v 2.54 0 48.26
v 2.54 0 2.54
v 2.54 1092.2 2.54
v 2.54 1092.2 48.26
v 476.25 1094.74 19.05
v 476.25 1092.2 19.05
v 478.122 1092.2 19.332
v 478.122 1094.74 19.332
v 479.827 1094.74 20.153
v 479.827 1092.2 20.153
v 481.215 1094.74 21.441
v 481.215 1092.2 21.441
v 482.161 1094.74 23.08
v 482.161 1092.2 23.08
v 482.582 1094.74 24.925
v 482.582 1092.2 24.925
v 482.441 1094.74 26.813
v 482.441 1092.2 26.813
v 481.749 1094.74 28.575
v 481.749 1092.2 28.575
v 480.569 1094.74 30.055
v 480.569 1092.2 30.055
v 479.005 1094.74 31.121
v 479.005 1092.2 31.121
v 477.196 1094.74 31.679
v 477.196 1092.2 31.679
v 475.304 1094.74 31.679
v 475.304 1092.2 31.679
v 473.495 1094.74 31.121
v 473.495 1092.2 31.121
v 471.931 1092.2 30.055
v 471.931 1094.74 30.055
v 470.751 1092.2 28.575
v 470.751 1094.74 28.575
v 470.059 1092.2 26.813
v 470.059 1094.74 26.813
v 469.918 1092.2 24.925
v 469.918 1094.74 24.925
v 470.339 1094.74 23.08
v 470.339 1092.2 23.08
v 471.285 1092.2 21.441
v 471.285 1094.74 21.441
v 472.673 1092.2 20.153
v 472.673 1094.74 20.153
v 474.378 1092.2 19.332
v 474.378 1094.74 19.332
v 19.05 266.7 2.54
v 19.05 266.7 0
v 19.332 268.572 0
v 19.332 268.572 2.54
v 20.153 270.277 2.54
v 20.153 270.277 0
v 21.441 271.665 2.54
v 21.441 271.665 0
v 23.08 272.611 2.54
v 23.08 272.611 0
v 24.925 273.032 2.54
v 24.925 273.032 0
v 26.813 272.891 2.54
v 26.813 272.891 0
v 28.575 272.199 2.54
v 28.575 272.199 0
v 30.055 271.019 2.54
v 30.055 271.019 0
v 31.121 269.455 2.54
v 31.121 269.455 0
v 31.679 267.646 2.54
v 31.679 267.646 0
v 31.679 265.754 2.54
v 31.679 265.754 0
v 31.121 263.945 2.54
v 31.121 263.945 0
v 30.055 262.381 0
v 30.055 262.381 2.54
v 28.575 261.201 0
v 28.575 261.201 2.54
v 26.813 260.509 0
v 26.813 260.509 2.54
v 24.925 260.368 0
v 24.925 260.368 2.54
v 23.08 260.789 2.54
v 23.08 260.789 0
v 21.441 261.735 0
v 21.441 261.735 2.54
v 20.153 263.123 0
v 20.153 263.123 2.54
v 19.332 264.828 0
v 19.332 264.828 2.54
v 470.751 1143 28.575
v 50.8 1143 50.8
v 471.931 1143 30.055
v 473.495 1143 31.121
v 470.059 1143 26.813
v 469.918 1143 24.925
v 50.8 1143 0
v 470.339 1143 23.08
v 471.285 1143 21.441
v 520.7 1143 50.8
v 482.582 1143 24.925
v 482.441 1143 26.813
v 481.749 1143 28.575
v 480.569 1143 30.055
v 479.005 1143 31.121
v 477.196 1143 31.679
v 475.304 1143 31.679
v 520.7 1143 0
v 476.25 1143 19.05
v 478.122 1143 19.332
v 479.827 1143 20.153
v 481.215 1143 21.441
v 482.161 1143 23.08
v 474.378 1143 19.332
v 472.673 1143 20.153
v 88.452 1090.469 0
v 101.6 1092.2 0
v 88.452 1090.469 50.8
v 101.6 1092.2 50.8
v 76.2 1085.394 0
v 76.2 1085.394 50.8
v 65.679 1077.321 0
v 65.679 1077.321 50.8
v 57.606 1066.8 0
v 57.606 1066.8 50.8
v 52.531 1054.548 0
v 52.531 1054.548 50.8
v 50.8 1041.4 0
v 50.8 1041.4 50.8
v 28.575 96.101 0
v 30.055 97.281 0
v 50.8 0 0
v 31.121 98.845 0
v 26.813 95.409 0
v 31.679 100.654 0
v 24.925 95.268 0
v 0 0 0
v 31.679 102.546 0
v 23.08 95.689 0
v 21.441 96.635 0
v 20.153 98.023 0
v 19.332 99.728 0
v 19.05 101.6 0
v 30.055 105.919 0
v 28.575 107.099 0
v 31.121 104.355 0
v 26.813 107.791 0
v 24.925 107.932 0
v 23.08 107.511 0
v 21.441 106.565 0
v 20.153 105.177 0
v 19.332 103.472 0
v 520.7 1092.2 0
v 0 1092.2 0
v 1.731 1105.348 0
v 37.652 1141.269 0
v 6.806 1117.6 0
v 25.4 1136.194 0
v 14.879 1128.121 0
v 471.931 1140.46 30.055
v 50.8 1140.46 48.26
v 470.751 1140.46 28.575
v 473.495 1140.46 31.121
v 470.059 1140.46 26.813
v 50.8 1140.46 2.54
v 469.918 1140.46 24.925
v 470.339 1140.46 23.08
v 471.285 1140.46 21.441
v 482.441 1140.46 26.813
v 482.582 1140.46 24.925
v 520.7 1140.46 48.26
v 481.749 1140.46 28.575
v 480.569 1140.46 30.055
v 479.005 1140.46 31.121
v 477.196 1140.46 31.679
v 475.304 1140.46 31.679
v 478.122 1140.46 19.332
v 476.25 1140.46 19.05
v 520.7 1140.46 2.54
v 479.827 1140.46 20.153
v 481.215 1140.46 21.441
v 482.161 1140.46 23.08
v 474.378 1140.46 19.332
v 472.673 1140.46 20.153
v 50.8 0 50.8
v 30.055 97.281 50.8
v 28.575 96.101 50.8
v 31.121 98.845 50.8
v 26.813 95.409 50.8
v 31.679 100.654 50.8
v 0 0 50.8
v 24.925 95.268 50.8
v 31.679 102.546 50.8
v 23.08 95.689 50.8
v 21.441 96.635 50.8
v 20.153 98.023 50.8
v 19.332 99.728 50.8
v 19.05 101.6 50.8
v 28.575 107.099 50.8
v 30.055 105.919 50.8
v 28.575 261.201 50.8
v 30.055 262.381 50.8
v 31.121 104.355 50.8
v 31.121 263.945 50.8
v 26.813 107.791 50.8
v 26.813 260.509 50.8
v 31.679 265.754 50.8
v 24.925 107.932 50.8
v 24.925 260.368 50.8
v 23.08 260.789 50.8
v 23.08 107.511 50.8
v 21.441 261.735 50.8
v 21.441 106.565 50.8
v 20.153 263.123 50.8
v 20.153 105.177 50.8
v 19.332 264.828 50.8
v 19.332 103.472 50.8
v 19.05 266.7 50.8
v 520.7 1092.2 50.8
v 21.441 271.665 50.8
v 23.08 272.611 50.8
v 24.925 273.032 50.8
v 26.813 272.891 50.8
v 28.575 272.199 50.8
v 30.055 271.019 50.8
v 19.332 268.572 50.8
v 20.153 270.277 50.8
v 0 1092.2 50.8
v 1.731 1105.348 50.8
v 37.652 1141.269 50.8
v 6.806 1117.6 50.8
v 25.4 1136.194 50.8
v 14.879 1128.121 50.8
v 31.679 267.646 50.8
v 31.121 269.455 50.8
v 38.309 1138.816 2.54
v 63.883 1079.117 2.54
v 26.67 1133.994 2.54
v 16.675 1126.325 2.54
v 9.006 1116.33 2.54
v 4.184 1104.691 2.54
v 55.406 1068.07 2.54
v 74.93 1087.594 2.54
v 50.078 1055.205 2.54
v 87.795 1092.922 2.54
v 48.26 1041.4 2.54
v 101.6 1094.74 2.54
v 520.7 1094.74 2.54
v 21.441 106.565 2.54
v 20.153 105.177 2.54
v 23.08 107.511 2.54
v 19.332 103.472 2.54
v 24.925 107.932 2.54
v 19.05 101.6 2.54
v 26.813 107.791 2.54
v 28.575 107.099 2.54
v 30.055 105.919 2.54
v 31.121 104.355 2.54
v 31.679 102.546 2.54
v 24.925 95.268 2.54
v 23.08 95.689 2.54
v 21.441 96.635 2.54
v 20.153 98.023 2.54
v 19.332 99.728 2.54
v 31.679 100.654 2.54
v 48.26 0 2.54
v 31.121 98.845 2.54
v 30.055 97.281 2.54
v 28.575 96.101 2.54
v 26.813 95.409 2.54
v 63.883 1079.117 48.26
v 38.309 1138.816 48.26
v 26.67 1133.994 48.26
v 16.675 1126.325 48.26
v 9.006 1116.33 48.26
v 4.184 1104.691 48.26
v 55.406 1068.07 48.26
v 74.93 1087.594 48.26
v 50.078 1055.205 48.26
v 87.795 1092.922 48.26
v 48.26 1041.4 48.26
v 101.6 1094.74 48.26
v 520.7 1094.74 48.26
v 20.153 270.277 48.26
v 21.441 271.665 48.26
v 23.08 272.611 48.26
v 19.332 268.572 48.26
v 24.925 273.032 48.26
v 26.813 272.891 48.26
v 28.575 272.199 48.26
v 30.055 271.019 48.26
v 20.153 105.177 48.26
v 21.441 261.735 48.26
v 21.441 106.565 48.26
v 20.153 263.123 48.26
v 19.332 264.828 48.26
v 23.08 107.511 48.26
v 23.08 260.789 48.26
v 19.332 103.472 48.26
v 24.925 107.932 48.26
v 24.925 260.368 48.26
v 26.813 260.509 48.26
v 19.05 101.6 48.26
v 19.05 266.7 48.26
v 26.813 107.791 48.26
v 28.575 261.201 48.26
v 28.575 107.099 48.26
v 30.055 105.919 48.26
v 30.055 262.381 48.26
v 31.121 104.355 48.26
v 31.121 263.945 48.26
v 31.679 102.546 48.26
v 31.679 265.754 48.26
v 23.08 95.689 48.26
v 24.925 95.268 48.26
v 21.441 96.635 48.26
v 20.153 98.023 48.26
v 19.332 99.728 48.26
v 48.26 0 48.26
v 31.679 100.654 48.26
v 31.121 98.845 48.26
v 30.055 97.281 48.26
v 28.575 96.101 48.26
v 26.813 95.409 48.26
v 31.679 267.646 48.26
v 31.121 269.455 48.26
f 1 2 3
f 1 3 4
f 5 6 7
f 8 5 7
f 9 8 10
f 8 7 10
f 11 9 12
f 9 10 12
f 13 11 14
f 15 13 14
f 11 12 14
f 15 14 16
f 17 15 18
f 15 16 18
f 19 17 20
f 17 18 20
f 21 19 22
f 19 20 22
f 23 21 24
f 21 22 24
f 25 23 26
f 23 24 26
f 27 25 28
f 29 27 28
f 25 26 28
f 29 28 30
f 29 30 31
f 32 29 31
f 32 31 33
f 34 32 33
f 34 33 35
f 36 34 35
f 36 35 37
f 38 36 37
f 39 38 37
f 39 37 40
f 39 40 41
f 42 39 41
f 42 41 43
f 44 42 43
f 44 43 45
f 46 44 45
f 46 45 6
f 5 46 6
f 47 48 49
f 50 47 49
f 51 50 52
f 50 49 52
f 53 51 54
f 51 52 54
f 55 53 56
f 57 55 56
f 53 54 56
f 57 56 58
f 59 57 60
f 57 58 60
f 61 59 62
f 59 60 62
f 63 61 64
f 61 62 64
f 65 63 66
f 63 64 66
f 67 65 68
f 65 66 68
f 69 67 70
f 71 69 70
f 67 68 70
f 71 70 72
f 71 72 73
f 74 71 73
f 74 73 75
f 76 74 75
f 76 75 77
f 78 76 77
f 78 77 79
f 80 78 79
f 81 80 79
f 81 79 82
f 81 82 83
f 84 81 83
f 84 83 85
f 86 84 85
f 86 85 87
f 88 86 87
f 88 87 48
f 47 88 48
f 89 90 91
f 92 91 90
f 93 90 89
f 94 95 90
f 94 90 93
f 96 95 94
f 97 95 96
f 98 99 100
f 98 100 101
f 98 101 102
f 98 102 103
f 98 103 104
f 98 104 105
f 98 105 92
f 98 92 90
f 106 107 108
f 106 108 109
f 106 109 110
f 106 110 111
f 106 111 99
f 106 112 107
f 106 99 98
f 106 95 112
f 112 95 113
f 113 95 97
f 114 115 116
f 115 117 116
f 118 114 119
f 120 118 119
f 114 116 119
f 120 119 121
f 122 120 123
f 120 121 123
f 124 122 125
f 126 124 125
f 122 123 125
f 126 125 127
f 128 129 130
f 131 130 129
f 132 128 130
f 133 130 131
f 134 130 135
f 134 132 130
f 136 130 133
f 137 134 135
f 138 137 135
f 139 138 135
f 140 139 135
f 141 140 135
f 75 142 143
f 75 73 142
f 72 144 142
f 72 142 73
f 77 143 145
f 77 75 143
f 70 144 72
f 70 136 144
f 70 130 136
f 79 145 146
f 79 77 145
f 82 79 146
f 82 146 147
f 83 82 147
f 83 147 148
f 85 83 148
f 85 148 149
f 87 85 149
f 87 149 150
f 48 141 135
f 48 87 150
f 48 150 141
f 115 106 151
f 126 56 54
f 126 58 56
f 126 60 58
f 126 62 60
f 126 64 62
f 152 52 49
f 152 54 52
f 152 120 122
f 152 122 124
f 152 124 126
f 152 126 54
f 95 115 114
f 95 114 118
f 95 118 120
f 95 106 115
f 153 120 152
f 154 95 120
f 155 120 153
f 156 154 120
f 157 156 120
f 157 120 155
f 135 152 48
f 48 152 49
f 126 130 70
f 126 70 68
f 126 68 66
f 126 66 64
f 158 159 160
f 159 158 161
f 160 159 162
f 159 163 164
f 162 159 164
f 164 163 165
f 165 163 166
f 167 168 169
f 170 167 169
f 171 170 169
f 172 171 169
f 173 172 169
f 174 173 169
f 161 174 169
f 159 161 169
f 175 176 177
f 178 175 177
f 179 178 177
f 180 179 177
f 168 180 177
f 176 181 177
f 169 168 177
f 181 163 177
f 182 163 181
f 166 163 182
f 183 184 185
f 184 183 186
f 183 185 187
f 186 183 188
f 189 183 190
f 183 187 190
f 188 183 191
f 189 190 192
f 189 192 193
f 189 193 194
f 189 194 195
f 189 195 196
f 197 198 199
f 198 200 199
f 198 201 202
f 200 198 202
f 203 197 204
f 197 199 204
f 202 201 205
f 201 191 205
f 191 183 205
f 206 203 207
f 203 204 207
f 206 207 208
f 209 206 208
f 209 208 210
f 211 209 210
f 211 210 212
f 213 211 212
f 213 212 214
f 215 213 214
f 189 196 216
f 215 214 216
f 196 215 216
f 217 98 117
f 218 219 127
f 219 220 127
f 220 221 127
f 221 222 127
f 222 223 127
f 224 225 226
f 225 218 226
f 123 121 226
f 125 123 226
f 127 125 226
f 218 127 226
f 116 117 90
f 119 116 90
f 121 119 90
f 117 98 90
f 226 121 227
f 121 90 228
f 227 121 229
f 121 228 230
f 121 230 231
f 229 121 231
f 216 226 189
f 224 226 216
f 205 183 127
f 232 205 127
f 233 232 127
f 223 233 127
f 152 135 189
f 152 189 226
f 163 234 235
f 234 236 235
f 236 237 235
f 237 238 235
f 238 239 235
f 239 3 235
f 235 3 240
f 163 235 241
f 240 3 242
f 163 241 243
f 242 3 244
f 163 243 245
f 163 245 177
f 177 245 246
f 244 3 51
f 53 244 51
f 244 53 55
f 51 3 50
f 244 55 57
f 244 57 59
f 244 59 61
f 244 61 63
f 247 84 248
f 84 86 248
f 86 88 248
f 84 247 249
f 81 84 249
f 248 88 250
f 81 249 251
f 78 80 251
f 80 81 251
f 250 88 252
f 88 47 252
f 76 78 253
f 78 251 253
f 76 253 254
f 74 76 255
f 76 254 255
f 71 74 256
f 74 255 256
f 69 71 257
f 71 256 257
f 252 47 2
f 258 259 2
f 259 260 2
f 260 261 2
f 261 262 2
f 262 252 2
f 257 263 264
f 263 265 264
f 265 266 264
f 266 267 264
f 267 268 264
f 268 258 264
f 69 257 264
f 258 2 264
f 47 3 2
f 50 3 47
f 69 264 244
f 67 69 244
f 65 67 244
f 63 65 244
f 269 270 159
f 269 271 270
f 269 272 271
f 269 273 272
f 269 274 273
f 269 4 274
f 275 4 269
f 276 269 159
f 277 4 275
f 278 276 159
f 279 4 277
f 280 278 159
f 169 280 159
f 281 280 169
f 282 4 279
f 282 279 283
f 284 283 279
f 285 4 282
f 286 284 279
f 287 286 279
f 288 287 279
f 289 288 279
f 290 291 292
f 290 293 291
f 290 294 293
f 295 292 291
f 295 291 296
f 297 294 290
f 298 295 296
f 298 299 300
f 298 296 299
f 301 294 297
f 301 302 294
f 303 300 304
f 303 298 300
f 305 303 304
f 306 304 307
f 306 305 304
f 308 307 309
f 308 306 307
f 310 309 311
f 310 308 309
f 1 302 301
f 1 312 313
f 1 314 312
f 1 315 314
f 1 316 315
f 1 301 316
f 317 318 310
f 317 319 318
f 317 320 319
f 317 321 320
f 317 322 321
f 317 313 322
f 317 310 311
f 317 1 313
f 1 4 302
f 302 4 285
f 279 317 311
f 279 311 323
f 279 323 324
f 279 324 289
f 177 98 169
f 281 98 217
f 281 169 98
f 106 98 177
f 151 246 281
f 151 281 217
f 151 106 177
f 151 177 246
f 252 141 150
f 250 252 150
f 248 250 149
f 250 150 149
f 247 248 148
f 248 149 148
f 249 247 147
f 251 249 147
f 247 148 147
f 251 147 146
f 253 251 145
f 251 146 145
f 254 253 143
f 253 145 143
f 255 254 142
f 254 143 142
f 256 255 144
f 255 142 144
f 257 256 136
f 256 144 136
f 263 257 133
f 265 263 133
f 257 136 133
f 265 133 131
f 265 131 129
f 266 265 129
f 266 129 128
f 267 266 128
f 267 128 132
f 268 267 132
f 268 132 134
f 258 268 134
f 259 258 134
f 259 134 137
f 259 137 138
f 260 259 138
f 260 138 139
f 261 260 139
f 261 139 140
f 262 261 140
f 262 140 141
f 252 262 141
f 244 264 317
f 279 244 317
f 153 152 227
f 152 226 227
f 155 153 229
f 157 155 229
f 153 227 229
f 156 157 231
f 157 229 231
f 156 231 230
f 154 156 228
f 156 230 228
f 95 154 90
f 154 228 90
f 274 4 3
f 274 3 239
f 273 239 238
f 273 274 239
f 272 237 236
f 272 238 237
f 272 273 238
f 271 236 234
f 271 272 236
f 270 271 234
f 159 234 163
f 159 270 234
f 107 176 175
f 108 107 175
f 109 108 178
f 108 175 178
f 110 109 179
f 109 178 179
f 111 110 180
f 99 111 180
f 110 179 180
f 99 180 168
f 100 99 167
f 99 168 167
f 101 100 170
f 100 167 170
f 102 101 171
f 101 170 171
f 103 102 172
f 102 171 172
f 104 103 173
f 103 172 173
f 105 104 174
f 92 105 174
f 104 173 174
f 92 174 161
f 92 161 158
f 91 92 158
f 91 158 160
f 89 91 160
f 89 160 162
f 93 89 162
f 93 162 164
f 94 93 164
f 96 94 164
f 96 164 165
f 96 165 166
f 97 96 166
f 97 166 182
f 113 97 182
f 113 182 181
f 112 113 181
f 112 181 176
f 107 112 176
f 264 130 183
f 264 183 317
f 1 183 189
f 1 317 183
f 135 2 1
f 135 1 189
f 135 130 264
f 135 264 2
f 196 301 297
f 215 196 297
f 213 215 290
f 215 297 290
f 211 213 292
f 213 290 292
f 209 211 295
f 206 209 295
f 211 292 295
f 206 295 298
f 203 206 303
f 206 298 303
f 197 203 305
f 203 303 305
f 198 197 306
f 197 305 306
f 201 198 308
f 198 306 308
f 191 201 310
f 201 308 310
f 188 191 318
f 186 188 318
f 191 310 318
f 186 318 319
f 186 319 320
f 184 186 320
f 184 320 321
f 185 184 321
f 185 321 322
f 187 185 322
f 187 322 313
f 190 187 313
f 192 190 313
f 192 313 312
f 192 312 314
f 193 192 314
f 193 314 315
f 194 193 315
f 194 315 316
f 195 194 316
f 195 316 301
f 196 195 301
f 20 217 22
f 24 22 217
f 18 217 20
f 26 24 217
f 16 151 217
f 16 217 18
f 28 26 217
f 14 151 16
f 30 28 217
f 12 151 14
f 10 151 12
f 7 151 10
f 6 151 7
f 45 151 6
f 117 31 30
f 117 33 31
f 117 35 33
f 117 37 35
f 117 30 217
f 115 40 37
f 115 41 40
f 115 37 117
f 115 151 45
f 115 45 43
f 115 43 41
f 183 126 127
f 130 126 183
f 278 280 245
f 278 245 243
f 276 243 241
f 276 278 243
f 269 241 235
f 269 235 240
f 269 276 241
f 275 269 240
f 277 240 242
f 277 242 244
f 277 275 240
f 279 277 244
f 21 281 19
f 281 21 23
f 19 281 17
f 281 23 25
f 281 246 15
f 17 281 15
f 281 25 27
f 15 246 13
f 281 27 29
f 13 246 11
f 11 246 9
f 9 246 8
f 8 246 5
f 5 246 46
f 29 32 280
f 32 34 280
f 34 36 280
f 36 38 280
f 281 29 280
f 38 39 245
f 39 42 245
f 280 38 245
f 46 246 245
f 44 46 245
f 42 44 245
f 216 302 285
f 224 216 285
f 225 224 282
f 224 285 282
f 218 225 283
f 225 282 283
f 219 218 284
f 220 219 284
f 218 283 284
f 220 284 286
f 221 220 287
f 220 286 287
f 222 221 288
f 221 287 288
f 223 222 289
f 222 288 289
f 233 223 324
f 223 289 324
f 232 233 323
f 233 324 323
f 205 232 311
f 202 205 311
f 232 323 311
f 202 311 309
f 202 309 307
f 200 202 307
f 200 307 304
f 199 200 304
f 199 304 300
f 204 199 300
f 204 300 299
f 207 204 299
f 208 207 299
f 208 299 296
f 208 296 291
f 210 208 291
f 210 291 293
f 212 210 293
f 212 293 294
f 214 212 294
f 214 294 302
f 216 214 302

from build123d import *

# Parameters (mm, degrees)
BOSS_EXTRUDE1_DEPTH       = 50.8
FILLET1_R                 = 50.8
SHELL1_T                  = -2.54
SKETCH2_W                 = 45.72
SKETCH2_H                 = 45.72
CUT_EXTRUDE1_DEPTH        = 50.8
F_97_0_5_DIAMETER_HOLE1_D = 12.7
F_97_0_5_DIAMETER_HOLE2_D = 12.7


with BuildPart() as part:
    # Sketch1 → Boss-Extrude1 (new body)
    with BuildSketch(Plane.XY):
        Polygon((0, 0), (0, 1143), (520.7, 1143), (520.7, 1092.2), (50.8, 1092.2), (50.8, 0), align=None)
    extrude(amount=BOSS_EXTRUDE1_DEPTH)

    # Fillet1
    fillet1_edges = [part.edges().sort_by_distance(p)[0] for p in [
        (0, 1143, 25.4),
        (50.8, 1092.2, 25.4),
    ]]
    fillet(fillet1_edges, radius=FILLET1_R)

    # Shell1
    shell1_openings = [part.faces().sort_by_distance(p)[0] for p in [
        (520.7, 1117.6, 25.4),
    ]]
    offset(amount=SHELL1_T, openings=shell1_openings, kind=Kind.INTERSECTION)

    # Sketch2 → Cut-Extrude1 (cut)
    with BuildSketch(Plane.XZ):
        with Locations((25.4, 25.4)):
            Rectangle(SKETCH2_W, SKETCH2_H)
    extrude(amount=-CUT_EXTRUDE1_DEPTH, mode=Mode.SUBTRACT)

    # #97 (0.5) Diameter Hole1 (through all)
    with Locations(Plane(origin=(476.25, 1143, 25.4), x_dir=(0, 0, 1), z_dir=(0, 1, 0))):
        with Locations((0, 0)):
            Hole(F_97_0_5_DIAMETER_HOLE1_D / 2)

    # #97 (0.5) Diameter Hole2 (through all)
    with Locations(Plane(origin=(25.4, 101.6, 50.8), x_dir=(1, 0, 0), z_dir=(0, 0, 1))):
        with Locations((0, 0), (0, 165.1)):
            Hole(F_97_0_5_DIAMETER_HOLE2_D / 2)


solid = part.part
